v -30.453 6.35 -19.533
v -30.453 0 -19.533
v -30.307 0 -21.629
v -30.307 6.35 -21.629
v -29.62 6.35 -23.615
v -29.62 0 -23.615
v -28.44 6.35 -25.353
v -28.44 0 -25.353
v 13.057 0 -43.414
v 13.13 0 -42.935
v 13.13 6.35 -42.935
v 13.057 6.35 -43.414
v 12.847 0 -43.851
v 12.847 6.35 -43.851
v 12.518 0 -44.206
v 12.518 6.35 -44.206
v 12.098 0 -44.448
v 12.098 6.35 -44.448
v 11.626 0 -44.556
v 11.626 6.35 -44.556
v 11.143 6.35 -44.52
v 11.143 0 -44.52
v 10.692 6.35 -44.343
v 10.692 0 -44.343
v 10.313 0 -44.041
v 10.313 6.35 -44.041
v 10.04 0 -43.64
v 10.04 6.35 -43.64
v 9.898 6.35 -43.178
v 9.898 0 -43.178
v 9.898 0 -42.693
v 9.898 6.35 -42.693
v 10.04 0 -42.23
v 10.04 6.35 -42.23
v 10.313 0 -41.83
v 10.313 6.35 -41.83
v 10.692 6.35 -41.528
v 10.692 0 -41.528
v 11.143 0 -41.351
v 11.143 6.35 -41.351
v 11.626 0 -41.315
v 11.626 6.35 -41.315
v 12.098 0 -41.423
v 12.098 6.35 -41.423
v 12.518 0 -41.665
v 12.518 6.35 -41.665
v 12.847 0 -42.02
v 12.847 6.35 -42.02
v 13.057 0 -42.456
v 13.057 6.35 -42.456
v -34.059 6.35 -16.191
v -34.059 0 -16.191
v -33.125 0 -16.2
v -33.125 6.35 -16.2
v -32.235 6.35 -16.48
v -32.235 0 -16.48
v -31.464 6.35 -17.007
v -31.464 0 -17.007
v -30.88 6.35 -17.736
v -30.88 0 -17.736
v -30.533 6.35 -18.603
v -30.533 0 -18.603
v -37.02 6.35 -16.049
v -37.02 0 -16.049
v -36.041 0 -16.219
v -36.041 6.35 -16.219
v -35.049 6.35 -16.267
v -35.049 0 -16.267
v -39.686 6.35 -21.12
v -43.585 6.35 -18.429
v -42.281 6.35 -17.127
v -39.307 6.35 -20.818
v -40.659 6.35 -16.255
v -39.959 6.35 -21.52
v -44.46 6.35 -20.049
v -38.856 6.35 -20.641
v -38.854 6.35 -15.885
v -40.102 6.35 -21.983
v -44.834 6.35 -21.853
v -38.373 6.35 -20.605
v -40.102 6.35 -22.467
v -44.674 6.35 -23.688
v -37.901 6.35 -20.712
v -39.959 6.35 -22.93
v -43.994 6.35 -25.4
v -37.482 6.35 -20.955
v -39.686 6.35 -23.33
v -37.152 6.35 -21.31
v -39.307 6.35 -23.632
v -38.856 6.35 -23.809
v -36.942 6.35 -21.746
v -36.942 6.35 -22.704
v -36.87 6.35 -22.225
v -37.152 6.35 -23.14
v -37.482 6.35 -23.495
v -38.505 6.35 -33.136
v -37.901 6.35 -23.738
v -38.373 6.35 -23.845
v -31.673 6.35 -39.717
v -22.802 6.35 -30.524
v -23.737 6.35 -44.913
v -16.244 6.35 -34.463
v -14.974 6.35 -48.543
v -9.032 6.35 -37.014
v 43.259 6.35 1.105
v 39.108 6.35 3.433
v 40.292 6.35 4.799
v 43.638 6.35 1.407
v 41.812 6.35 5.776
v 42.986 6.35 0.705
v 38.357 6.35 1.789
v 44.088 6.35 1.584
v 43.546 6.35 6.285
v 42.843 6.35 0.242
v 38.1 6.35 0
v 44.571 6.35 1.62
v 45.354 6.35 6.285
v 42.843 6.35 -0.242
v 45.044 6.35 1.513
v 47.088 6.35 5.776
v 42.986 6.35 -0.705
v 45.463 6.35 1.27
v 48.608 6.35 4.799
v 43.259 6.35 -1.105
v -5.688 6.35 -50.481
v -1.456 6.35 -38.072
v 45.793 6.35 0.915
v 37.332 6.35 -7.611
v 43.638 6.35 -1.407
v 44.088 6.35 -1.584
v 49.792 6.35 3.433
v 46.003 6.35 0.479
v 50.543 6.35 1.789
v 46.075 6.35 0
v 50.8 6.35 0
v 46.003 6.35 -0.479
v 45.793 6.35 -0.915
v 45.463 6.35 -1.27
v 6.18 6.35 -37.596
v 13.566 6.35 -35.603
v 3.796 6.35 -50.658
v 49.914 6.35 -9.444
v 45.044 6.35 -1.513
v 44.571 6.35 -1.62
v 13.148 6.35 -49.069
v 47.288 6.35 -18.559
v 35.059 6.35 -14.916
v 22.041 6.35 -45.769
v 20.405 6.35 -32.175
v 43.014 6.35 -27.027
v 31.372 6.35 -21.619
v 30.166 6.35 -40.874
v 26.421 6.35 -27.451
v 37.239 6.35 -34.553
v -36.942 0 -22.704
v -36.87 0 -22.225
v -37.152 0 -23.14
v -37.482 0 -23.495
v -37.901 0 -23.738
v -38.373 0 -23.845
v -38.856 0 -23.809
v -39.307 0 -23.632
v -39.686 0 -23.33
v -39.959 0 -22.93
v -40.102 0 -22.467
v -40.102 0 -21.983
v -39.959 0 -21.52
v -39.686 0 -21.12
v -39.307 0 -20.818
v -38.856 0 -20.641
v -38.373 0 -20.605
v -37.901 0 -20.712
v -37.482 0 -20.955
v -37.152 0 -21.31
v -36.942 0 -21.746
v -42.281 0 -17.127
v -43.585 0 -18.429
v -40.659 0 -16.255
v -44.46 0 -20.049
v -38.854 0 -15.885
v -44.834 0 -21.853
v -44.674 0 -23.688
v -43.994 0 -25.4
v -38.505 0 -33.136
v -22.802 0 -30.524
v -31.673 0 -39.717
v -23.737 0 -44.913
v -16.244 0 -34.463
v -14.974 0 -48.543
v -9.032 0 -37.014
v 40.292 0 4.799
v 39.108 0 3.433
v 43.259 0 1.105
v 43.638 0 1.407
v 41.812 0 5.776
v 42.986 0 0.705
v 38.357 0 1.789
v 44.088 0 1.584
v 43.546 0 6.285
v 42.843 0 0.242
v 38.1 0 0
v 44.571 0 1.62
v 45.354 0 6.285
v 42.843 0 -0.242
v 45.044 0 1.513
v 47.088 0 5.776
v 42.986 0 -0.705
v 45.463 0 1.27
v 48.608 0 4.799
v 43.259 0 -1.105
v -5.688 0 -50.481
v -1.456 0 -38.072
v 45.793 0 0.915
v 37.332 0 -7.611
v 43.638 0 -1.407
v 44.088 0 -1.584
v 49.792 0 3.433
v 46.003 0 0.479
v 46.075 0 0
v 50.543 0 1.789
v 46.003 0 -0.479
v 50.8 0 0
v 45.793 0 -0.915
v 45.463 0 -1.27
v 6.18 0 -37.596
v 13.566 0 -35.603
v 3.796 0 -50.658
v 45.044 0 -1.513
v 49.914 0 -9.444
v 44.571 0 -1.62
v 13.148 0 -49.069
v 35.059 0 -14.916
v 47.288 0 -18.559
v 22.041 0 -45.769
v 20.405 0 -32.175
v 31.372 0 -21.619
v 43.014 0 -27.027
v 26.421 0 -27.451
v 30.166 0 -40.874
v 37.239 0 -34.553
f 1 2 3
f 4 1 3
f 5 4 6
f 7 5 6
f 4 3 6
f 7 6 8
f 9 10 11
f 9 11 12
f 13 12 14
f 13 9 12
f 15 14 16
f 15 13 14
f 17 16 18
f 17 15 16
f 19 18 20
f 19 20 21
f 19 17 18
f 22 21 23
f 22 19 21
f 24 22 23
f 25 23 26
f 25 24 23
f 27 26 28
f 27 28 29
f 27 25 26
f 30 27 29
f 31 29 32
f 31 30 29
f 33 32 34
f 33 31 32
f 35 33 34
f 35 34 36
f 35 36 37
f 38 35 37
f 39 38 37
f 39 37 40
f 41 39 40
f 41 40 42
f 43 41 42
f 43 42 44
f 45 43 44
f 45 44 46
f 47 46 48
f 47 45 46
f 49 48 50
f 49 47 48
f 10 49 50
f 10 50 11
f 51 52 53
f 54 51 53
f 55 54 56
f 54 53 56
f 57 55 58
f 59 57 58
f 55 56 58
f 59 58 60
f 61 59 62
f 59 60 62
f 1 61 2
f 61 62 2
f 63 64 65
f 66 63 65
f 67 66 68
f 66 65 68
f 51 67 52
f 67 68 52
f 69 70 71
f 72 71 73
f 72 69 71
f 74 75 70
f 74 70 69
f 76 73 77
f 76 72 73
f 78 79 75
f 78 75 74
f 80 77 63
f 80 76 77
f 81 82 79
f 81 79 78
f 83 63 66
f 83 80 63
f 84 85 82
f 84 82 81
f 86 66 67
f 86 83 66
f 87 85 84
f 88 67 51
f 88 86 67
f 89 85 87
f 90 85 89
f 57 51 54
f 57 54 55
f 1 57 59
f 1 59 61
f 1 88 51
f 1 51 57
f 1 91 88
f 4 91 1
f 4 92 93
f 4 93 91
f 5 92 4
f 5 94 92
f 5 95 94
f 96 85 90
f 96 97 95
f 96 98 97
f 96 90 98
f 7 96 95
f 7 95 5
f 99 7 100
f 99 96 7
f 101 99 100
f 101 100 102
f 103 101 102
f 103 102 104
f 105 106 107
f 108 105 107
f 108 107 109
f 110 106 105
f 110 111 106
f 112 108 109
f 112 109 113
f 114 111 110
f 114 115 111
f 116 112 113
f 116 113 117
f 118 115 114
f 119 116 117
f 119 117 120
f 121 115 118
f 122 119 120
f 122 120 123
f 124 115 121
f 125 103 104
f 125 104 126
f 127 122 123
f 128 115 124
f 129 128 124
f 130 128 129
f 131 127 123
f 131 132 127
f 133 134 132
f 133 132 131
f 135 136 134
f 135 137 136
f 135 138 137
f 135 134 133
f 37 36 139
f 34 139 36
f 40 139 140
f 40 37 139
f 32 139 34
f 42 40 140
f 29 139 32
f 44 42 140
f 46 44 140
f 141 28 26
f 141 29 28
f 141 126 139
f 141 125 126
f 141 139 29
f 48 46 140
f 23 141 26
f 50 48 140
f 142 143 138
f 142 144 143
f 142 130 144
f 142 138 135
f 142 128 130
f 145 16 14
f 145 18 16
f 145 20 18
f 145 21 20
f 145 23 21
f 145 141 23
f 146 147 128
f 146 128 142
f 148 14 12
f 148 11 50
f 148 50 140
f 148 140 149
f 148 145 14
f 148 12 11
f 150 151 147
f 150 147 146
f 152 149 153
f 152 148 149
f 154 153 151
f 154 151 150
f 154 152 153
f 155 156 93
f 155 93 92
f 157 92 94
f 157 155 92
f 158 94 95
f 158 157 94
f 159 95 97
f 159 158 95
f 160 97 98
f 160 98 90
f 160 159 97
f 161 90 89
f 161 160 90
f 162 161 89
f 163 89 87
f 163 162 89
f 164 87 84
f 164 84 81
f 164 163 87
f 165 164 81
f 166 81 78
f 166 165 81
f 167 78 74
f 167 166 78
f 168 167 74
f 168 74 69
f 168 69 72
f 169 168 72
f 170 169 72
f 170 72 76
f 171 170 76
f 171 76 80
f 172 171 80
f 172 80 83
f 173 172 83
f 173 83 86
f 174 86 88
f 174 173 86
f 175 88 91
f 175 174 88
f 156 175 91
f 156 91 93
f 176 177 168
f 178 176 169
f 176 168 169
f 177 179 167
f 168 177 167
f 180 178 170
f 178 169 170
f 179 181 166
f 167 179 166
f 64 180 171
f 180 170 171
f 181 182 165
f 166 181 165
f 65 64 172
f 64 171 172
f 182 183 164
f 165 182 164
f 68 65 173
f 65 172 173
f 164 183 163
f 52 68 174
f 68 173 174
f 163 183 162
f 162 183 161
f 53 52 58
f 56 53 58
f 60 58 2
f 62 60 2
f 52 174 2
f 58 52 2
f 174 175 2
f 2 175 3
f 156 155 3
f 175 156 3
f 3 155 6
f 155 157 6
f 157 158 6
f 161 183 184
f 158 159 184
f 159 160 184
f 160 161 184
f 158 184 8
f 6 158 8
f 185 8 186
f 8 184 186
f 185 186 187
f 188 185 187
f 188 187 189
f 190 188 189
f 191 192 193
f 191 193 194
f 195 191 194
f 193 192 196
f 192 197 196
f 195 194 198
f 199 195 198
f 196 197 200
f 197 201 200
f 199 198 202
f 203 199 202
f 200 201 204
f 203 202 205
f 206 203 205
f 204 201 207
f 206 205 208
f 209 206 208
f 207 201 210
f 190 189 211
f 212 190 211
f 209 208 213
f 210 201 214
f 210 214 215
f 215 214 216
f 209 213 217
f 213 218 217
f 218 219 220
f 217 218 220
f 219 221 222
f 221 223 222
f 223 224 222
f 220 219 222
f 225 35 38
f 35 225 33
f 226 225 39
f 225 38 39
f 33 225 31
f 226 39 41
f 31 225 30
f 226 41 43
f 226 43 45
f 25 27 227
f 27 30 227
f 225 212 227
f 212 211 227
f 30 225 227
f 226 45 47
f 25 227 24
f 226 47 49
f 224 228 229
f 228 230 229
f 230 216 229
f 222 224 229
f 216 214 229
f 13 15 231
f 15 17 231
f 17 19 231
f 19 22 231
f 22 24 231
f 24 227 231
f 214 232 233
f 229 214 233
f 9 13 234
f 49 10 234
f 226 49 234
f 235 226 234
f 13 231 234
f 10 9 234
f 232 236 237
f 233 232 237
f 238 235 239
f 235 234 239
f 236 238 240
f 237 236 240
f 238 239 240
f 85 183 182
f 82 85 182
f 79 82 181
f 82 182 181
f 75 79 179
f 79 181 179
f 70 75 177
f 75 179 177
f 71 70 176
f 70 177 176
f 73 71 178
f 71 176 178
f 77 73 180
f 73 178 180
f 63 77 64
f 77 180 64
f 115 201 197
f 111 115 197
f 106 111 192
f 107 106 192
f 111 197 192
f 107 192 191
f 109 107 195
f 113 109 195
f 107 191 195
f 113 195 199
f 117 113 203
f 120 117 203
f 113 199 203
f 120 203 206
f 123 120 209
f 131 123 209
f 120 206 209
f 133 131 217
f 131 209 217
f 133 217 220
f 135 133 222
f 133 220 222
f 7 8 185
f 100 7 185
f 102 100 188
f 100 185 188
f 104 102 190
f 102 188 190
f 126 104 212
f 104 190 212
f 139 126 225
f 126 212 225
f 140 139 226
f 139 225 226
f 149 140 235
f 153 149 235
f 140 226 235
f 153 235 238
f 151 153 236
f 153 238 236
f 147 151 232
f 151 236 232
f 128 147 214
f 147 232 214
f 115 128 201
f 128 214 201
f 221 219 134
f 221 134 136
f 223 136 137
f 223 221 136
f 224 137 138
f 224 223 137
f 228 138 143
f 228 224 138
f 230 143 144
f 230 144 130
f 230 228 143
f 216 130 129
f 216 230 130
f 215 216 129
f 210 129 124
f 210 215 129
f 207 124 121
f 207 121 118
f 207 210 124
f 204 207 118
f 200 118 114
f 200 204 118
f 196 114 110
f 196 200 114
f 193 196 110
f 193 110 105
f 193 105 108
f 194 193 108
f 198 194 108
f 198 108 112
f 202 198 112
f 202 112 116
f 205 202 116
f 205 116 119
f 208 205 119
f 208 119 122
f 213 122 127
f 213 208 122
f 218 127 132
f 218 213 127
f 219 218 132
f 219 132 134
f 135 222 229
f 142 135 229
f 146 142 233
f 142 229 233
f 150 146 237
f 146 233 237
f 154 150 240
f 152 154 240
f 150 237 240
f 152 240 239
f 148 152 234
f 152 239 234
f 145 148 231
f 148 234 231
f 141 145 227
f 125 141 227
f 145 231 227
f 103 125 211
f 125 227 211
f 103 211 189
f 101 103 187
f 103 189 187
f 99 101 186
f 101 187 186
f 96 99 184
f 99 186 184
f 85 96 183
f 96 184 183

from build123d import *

# Parameters (mm, degrees)
SKETCH1_R           = 1.625
BOSS_EXTRUDE1_DEPTH = 6.35


with BuildPart() as part:
    # Sketch1 → Boss-Extrude1 (new body)
    with BuildSketch(Plane(origin=(0, 0, 0), x_dir=(1, 0, 0), z_dir=(0, 1, 0))):
        with BuildLine():
            ThreePointArc((50.8, 0), (13.148007491, 49.069031975), (-43.994090512, 25.4))
            ThreePointArc((-43.994090512, 25.4), (-43.585026823, 18.428634878), (-37.019722443, 16.048709846))
            ThreePointArc((-37.019722443, 16.048709846), (-35.546093598, 16.258298381), (-34.059144925, 16.191268754))
            ThreePointArc((-34.059144925, 16.191268754), (-31.463683221, 17.007149664), (-30.452841612, 19.533071743))
            ThreePointArc((-30.452841612, 19.533071743), (-30.028839685, 22.644562363), (-28.439901214, 25.353146135))
            ThreePointArc((-28.439901214, 25.353146135), (13.565577093, 35.603161631), (38.1, 0))
            ThreePointArc((38.1, 0), (44.45, -6.35), (50.8, 0))
        make_face()
        with Locations((-38.494829198, 22.225)):
            Circle(SKETCH1_R, mode=Mode.SUBTRACT)
        with Locations((44.45, 0)):
            Circle(SKETCH1_R, mode=Mode.SUBTRACT)
        with Locations((11.504506555, 42.935402979)):
            Circle(SKETCH1_R, mode=Mode.SUBTRACT)
    extrude(amount=BOSS_EXTRUDE1_DEPTH)


solid = part.part
